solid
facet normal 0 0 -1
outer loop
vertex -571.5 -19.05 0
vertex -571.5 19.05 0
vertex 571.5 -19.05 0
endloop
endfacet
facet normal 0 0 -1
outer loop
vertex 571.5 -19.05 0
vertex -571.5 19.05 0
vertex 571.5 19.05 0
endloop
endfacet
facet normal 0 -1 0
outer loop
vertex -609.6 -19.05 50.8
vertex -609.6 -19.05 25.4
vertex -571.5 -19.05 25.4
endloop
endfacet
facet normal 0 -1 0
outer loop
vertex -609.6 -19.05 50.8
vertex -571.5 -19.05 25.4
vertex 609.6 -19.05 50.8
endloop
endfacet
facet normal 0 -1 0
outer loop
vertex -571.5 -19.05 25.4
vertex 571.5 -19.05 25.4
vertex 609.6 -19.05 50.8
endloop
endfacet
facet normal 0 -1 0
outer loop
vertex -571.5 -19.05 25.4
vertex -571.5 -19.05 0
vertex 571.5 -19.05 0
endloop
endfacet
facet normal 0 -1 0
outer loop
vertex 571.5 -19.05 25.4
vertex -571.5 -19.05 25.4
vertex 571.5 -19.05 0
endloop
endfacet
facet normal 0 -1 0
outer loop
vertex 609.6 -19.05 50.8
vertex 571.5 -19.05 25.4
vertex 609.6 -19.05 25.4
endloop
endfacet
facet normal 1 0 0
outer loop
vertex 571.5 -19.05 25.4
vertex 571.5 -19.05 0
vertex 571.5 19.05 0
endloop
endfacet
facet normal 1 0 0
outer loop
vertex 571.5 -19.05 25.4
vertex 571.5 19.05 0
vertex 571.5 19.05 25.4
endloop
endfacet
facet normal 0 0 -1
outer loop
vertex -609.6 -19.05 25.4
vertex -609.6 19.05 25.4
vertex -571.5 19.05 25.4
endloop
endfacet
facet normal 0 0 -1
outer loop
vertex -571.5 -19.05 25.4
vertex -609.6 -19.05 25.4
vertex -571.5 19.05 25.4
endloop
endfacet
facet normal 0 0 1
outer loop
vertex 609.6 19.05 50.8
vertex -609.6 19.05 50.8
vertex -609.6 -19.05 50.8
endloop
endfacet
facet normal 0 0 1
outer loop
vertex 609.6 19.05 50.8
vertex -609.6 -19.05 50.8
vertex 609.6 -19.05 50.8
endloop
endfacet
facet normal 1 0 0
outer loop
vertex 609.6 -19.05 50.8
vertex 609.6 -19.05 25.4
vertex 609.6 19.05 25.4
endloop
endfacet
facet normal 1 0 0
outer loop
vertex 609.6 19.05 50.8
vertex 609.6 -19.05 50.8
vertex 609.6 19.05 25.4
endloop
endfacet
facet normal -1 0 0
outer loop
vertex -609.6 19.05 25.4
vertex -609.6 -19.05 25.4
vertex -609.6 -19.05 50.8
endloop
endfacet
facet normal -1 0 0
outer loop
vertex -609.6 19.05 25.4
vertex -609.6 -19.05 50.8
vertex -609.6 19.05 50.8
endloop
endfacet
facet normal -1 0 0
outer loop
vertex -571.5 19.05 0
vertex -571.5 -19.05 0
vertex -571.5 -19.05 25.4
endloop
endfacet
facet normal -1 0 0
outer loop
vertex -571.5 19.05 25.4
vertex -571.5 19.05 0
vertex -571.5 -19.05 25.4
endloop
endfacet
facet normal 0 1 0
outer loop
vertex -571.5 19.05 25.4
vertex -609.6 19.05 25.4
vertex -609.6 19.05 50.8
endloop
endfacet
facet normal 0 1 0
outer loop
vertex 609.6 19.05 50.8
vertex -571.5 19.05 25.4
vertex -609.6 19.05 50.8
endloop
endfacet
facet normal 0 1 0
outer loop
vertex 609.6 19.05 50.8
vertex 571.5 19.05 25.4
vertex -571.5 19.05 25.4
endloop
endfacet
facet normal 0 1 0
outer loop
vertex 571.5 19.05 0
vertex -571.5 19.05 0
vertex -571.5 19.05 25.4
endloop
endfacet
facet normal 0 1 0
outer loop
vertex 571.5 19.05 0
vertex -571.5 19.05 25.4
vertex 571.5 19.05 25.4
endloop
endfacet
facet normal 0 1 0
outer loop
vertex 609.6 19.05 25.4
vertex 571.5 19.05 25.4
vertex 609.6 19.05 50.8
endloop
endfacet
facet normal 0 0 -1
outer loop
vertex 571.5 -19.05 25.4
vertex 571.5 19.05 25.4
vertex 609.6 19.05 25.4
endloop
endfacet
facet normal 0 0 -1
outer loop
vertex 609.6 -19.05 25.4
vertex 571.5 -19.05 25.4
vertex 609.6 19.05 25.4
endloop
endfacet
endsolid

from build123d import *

# Parameters (mm, degrees)
F0_W     = 1219.2
F0_H     = 38.1
F1_DEPTH = 50.8
F2_W     = 38.1
F2_H     = 25.4
F3_DEPTH = 38.1


with BuildPart() as f1:
    # F0 (on Top) → F1 (new body)
    with BuildSketch(Plane.XY):
        Rectangle(F0_W, F0_H)
    extrude(amount=F1_DEPTH)

    # F2 (on face) → F3 (cut)
    with BuildSketch(Plane.XZ.offset(19.05)):
        with Locations((590.55, 12.7)):
            Rectangle(F2_W, F2_H)
        with Locations((-590.55, 12.7)):
            Rectangle(F2_W, F2_H)
    extrude(amount=-F3_DEPTH, mode=Mode.SUBTRACT)


solid = f1.part
